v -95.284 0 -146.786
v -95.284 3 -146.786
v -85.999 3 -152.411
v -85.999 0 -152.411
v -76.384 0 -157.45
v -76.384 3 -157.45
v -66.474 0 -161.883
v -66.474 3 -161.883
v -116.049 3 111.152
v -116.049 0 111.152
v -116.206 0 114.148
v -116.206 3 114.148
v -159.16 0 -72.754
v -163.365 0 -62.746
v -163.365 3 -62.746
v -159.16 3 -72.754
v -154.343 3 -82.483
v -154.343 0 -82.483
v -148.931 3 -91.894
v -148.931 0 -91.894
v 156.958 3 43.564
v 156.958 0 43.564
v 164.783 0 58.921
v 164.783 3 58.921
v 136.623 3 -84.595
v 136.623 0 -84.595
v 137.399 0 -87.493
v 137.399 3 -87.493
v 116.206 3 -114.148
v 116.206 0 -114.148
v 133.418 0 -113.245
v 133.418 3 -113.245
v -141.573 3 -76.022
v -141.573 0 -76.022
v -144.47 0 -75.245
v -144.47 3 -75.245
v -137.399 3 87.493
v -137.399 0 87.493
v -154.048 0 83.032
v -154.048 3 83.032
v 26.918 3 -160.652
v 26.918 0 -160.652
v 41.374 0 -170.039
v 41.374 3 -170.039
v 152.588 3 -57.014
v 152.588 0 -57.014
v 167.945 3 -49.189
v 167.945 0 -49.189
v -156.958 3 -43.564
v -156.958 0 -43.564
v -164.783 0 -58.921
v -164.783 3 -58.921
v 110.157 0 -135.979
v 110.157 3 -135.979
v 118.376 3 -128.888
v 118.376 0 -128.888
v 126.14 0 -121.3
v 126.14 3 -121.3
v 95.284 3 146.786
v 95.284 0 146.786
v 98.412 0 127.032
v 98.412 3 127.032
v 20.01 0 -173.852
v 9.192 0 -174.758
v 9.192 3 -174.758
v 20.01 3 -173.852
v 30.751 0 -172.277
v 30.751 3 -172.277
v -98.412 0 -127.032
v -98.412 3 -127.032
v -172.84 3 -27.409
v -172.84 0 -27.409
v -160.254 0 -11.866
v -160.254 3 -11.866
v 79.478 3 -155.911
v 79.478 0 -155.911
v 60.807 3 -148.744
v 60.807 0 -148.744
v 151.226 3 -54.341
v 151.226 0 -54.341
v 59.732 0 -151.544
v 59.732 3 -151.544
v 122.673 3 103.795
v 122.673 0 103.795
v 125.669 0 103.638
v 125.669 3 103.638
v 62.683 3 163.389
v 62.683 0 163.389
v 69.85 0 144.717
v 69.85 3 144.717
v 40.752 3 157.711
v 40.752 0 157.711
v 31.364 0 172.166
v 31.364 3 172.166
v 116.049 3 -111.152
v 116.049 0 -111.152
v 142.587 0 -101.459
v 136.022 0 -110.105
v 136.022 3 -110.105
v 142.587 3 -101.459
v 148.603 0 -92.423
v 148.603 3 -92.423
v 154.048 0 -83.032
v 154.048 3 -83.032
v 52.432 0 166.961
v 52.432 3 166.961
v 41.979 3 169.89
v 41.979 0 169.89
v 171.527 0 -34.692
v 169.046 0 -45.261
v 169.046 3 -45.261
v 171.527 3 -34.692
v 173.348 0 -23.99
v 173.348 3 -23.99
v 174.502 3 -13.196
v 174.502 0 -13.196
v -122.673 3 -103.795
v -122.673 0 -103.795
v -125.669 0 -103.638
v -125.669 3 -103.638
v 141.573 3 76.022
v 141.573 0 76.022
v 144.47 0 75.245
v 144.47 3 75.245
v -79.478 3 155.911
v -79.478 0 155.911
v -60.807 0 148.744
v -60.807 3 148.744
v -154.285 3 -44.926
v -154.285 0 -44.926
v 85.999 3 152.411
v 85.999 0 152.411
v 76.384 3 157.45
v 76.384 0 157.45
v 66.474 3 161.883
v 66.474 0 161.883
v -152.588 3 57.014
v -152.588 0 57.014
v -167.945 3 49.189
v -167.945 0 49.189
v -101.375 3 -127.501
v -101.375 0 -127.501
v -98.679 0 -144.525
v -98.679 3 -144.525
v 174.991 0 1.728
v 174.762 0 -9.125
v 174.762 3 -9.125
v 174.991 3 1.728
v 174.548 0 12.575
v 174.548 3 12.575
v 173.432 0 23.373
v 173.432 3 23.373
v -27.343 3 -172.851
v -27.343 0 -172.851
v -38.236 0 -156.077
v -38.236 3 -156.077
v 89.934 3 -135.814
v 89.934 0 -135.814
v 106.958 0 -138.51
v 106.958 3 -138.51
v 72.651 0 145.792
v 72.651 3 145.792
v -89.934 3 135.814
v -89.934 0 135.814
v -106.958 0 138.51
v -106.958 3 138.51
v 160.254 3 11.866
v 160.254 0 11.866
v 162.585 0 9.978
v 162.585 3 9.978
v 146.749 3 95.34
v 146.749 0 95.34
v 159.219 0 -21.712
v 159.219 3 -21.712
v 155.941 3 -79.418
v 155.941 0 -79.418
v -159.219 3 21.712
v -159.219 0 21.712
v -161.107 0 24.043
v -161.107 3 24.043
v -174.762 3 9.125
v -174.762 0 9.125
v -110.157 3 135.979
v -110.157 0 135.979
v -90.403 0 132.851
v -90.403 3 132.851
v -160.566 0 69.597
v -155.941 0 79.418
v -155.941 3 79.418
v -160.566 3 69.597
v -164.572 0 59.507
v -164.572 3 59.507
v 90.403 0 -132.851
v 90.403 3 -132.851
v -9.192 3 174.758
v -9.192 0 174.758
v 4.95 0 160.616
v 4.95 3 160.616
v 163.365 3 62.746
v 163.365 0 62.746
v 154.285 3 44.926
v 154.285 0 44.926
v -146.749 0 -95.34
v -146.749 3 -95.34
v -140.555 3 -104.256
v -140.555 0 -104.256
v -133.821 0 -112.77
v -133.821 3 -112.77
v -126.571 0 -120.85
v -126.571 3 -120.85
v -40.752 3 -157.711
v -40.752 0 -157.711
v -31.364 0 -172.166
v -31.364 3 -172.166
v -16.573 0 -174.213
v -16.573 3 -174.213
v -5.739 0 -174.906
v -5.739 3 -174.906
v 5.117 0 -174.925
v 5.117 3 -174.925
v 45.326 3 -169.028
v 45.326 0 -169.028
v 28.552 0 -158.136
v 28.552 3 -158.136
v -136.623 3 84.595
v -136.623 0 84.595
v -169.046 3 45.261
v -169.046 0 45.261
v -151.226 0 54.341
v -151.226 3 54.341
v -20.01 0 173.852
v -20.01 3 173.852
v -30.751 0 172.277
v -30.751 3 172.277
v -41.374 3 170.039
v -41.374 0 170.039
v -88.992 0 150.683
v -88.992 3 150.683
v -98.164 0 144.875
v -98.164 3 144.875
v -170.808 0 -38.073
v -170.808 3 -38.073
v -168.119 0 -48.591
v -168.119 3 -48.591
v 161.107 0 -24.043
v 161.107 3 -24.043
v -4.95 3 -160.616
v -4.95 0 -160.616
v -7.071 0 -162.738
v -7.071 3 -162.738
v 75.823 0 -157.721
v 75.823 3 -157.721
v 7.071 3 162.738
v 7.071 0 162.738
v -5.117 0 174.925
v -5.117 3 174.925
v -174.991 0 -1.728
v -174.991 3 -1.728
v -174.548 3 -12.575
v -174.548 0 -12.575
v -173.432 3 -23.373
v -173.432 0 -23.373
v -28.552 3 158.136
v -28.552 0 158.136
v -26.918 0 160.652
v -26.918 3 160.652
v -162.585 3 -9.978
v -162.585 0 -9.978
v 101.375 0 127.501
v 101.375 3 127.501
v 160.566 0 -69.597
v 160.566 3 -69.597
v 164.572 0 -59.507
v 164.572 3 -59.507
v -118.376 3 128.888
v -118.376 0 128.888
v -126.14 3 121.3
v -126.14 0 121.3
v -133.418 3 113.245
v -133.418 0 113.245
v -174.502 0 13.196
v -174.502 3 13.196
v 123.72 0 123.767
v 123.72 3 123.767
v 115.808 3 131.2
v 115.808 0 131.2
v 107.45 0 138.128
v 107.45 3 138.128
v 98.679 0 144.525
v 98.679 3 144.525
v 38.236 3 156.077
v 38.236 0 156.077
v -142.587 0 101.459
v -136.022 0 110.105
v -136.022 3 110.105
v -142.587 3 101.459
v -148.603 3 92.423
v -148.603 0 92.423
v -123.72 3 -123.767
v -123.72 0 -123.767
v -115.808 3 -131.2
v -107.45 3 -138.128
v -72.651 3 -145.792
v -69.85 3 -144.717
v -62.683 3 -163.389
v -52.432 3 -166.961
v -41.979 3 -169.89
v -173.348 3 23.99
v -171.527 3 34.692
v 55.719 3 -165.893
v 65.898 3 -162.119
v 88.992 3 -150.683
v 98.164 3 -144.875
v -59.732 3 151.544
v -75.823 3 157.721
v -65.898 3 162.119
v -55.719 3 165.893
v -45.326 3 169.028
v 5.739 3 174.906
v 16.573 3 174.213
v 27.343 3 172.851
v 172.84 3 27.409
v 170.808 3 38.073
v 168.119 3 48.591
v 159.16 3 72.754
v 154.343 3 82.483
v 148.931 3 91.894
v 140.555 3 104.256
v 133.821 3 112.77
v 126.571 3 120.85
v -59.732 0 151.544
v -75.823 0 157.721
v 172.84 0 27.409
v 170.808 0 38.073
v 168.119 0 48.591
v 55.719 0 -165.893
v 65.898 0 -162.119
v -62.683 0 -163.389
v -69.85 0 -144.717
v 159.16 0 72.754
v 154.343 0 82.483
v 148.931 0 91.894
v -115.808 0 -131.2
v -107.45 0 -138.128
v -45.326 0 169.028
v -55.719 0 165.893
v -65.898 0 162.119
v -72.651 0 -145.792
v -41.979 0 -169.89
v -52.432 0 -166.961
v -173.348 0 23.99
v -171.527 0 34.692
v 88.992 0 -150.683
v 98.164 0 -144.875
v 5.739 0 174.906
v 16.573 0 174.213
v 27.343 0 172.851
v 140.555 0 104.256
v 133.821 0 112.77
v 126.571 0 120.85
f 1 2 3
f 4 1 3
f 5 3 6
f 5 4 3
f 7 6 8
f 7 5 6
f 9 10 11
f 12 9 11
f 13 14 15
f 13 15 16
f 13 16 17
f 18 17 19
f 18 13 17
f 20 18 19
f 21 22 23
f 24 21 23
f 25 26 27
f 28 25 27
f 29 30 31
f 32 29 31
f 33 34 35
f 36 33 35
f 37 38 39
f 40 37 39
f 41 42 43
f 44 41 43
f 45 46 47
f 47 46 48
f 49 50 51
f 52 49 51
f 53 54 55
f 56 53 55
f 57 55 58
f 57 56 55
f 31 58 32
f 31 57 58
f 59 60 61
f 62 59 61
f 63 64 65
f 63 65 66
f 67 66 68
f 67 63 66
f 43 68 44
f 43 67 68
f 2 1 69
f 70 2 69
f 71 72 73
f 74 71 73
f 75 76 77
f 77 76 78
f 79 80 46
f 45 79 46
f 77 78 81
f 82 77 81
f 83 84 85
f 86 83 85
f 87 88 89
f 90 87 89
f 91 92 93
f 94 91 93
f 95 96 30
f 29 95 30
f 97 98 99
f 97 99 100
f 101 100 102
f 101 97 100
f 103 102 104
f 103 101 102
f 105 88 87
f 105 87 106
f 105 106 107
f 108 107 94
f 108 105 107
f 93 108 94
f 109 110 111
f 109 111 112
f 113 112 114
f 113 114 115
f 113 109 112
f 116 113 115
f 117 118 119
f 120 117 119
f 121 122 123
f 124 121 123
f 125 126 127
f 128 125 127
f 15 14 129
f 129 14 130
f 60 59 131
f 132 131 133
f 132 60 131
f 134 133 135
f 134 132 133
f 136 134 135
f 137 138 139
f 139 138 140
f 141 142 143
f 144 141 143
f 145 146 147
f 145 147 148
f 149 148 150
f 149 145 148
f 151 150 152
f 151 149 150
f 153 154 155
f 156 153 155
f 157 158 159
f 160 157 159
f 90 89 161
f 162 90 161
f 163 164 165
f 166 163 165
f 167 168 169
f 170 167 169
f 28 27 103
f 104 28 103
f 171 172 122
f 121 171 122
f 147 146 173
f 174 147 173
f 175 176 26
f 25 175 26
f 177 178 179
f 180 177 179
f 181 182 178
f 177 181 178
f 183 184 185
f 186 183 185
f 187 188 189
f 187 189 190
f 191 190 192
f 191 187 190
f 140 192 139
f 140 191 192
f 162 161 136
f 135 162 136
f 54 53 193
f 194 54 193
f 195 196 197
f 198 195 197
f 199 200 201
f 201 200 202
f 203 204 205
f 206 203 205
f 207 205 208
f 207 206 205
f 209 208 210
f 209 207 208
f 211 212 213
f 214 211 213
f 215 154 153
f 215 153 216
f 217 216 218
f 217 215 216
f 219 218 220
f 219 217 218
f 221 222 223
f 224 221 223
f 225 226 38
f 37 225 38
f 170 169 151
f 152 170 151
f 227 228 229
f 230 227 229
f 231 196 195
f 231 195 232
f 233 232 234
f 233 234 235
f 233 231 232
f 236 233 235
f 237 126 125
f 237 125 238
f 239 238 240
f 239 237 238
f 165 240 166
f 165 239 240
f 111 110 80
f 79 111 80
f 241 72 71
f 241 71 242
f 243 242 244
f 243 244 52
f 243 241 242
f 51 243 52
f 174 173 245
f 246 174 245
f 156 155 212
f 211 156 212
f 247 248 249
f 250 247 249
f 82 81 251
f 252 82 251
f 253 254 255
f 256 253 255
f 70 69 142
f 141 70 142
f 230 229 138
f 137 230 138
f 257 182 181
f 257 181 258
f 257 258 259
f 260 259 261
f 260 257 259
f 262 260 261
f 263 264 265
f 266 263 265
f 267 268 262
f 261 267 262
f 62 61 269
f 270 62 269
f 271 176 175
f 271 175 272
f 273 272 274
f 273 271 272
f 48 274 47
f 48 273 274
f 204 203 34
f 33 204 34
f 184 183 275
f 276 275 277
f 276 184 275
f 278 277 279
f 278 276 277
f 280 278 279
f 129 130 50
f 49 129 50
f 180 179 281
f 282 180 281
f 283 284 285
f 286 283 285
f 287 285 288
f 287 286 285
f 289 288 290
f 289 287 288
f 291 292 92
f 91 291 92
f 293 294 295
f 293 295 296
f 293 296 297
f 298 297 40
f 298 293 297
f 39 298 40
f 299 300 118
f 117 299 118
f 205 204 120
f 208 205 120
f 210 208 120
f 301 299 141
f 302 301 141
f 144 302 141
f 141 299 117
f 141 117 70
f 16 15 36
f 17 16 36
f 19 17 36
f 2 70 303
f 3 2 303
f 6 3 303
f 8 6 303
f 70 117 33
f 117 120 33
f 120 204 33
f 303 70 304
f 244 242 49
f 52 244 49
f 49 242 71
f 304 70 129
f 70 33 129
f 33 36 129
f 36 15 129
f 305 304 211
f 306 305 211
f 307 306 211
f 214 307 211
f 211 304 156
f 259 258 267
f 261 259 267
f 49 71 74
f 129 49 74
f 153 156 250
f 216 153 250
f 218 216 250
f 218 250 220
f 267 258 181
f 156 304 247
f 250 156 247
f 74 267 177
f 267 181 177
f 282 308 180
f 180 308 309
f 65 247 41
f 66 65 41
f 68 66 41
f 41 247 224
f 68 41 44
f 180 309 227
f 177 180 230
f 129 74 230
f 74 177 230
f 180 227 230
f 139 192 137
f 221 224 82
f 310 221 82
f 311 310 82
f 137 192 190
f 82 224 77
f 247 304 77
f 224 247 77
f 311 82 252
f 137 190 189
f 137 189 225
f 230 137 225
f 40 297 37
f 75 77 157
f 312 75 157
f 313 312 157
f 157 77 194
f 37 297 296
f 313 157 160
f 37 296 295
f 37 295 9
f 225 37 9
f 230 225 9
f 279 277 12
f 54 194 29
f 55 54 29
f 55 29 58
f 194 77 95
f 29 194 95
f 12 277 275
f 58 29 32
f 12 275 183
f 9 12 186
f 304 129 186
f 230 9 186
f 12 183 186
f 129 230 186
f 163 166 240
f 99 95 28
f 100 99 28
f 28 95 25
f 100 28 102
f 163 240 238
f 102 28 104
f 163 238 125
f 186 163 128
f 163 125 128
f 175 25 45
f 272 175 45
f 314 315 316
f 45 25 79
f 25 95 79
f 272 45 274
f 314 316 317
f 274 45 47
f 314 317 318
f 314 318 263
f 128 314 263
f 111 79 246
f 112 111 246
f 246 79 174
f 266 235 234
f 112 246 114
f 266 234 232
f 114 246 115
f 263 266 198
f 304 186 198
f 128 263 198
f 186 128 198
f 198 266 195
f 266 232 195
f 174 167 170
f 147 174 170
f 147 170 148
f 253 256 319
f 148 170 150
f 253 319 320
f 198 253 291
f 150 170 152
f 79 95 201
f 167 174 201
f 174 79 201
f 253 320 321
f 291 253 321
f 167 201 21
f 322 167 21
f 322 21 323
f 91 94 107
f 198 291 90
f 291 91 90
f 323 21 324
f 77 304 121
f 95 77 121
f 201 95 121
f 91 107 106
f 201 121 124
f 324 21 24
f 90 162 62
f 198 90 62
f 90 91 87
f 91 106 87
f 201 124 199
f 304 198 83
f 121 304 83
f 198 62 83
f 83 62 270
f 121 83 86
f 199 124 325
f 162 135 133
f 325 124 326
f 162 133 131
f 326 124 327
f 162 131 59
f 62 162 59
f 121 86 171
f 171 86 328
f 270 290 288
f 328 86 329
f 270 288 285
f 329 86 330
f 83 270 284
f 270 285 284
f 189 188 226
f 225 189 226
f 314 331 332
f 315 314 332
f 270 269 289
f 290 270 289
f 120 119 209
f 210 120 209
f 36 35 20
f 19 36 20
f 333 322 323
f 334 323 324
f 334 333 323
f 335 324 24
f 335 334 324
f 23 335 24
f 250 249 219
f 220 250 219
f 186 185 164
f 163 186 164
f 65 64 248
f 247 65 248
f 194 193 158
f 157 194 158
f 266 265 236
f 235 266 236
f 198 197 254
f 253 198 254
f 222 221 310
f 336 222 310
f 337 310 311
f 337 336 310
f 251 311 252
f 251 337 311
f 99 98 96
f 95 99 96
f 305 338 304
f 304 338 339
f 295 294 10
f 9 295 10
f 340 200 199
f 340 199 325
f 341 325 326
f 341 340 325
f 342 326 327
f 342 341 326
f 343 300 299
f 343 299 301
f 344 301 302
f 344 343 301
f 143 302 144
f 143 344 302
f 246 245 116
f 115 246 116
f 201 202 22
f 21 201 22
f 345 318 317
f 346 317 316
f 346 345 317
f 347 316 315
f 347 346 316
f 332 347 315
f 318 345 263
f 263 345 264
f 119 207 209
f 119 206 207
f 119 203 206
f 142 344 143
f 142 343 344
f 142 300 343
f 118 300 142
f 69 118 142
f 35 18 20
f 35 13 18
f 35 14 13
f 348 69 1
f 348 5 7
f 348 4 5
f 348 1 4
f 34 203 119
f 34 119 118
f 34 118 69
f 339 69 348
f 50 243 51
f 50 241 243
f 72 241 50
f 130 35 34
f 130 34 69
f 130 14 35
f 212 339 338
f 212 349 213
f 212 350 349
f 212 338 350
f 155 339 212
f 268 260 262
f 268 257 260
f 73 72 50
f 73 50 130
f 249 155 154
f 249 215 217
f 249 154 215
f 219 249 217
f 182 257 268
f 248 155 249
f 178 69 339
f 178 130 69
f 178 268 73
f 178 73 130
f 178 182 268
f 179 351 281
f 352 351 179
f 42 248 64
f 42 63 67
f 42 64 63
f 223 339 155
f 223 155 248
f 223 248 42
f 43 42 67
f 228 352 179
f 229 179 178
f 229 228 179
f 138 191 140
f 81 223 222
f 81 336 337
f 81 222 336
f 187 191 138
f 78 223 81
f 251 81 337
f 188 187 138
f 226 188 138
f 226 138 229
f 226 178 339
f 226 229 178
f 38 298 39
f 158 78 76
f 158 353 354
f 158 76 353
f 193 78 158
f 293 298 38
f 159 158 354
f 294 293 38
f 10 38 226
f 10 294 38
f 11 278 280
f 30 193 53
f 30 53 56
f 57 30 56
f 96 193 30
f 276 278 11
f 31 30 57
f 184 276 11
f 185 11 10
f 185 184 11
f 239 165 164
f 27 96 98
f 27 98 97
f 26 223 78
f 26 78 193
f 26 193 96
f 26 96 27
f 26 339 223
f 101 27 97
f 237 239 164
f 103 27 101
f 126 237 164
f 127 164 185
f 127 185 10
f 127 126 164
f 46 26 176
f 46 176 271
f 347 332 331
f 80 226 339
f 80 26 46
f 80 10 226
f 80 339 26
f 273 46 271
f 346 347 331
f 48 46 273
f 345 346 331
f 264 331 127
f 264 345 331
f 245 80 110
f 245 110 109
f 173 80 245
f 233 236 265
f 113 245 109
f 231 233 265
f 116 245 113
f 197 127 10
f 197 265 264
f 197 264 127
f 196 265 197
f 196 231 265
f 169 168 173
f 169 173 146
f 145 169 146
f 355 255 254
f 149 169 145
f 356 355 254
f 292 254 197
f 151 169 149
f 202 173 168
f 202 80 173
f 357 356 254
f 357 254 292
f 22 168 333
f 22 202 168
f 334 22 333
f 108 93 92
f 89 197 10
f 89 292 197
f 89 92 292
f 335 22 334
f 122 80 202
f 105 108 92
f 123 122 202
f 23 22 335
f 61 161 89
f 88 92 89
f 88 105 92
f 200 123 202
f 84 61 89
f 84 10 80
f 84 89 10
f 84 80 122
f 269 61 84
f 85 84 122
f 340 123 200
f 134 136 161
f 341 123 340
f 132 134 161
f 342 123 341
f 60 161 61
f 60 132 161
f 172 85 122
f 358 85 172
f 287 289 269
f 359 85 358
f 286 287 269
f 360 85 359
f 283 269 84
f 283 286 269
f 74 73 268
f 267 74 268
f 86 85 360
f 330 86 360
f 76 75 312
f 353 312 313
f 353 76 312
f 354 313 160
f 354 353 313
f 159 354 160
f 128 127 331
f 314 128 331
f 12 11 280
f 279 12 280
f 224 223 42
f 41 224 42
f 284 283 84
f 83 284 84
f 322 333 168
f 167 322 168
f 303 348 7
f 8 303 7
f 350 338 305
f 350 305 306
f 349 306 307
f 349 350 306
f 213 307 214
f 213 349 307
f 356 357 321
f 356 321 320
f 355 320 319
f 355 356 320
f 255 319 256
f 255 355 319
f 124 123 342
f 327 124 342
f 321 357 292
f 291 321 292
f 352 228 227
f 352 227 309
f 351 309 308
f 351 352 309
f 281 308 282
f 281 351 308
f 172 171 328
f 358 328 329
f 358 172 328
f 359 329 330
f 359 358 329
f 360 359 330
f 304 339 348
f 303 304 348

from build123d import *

# Parameters (mm, degrees)
F0_R            = 175
F1_DEPTH        = 3
F3_DEPTH        = 3.001
F3_COPIES_COUNT = 30


# Not quite as in the source:
# - a pattern or mirror of a feature is missing from the dataset's text; its kind, count and spacing are read off the source's solid


with BuildPart() as f1:
    # F0 (on Front) → F1 (new body)
    with BuildSketch(Plane.XZ):
        Circle(F0_R)
    extrude(amount=-F1_DEPTH)

    # F2 (on face) → F3 (cut, through all)
    with BuildSketch(Plane.XZ):
        with BuildLine():
            ThreePointArc((-5.1165300167, 174.9251872104), (-7.1549450675, 174.8536724266), (-9.1923881554, 174.758404662))
            Line((-9.1923881554, 174.758404662), (4.9497474683, 160.6162690382))
            Line((4.9497474683, 160.6162690382), (7.0710678119, 162.7375893818))
            Line((7.0710678119, 162.7375893818), (-5.1165300167, 174.9251872104))
        make_face()
    f3 = extrude(amount=-F3_DEPTH, mode=Mode.SUBTRACT)

    # F3_copies: F3 ×30 about axis
    f3_copies_axis = Axis((0, 0, 0), (0, 1, 0))
    for i in range(1, F3_COPIES_COUNT):
        add(f3.rotate(f3_copies_axis, i * 360 / F3_COPIES_COUNT), mode=Mode.SUBTRACT)


solid = f1.part
